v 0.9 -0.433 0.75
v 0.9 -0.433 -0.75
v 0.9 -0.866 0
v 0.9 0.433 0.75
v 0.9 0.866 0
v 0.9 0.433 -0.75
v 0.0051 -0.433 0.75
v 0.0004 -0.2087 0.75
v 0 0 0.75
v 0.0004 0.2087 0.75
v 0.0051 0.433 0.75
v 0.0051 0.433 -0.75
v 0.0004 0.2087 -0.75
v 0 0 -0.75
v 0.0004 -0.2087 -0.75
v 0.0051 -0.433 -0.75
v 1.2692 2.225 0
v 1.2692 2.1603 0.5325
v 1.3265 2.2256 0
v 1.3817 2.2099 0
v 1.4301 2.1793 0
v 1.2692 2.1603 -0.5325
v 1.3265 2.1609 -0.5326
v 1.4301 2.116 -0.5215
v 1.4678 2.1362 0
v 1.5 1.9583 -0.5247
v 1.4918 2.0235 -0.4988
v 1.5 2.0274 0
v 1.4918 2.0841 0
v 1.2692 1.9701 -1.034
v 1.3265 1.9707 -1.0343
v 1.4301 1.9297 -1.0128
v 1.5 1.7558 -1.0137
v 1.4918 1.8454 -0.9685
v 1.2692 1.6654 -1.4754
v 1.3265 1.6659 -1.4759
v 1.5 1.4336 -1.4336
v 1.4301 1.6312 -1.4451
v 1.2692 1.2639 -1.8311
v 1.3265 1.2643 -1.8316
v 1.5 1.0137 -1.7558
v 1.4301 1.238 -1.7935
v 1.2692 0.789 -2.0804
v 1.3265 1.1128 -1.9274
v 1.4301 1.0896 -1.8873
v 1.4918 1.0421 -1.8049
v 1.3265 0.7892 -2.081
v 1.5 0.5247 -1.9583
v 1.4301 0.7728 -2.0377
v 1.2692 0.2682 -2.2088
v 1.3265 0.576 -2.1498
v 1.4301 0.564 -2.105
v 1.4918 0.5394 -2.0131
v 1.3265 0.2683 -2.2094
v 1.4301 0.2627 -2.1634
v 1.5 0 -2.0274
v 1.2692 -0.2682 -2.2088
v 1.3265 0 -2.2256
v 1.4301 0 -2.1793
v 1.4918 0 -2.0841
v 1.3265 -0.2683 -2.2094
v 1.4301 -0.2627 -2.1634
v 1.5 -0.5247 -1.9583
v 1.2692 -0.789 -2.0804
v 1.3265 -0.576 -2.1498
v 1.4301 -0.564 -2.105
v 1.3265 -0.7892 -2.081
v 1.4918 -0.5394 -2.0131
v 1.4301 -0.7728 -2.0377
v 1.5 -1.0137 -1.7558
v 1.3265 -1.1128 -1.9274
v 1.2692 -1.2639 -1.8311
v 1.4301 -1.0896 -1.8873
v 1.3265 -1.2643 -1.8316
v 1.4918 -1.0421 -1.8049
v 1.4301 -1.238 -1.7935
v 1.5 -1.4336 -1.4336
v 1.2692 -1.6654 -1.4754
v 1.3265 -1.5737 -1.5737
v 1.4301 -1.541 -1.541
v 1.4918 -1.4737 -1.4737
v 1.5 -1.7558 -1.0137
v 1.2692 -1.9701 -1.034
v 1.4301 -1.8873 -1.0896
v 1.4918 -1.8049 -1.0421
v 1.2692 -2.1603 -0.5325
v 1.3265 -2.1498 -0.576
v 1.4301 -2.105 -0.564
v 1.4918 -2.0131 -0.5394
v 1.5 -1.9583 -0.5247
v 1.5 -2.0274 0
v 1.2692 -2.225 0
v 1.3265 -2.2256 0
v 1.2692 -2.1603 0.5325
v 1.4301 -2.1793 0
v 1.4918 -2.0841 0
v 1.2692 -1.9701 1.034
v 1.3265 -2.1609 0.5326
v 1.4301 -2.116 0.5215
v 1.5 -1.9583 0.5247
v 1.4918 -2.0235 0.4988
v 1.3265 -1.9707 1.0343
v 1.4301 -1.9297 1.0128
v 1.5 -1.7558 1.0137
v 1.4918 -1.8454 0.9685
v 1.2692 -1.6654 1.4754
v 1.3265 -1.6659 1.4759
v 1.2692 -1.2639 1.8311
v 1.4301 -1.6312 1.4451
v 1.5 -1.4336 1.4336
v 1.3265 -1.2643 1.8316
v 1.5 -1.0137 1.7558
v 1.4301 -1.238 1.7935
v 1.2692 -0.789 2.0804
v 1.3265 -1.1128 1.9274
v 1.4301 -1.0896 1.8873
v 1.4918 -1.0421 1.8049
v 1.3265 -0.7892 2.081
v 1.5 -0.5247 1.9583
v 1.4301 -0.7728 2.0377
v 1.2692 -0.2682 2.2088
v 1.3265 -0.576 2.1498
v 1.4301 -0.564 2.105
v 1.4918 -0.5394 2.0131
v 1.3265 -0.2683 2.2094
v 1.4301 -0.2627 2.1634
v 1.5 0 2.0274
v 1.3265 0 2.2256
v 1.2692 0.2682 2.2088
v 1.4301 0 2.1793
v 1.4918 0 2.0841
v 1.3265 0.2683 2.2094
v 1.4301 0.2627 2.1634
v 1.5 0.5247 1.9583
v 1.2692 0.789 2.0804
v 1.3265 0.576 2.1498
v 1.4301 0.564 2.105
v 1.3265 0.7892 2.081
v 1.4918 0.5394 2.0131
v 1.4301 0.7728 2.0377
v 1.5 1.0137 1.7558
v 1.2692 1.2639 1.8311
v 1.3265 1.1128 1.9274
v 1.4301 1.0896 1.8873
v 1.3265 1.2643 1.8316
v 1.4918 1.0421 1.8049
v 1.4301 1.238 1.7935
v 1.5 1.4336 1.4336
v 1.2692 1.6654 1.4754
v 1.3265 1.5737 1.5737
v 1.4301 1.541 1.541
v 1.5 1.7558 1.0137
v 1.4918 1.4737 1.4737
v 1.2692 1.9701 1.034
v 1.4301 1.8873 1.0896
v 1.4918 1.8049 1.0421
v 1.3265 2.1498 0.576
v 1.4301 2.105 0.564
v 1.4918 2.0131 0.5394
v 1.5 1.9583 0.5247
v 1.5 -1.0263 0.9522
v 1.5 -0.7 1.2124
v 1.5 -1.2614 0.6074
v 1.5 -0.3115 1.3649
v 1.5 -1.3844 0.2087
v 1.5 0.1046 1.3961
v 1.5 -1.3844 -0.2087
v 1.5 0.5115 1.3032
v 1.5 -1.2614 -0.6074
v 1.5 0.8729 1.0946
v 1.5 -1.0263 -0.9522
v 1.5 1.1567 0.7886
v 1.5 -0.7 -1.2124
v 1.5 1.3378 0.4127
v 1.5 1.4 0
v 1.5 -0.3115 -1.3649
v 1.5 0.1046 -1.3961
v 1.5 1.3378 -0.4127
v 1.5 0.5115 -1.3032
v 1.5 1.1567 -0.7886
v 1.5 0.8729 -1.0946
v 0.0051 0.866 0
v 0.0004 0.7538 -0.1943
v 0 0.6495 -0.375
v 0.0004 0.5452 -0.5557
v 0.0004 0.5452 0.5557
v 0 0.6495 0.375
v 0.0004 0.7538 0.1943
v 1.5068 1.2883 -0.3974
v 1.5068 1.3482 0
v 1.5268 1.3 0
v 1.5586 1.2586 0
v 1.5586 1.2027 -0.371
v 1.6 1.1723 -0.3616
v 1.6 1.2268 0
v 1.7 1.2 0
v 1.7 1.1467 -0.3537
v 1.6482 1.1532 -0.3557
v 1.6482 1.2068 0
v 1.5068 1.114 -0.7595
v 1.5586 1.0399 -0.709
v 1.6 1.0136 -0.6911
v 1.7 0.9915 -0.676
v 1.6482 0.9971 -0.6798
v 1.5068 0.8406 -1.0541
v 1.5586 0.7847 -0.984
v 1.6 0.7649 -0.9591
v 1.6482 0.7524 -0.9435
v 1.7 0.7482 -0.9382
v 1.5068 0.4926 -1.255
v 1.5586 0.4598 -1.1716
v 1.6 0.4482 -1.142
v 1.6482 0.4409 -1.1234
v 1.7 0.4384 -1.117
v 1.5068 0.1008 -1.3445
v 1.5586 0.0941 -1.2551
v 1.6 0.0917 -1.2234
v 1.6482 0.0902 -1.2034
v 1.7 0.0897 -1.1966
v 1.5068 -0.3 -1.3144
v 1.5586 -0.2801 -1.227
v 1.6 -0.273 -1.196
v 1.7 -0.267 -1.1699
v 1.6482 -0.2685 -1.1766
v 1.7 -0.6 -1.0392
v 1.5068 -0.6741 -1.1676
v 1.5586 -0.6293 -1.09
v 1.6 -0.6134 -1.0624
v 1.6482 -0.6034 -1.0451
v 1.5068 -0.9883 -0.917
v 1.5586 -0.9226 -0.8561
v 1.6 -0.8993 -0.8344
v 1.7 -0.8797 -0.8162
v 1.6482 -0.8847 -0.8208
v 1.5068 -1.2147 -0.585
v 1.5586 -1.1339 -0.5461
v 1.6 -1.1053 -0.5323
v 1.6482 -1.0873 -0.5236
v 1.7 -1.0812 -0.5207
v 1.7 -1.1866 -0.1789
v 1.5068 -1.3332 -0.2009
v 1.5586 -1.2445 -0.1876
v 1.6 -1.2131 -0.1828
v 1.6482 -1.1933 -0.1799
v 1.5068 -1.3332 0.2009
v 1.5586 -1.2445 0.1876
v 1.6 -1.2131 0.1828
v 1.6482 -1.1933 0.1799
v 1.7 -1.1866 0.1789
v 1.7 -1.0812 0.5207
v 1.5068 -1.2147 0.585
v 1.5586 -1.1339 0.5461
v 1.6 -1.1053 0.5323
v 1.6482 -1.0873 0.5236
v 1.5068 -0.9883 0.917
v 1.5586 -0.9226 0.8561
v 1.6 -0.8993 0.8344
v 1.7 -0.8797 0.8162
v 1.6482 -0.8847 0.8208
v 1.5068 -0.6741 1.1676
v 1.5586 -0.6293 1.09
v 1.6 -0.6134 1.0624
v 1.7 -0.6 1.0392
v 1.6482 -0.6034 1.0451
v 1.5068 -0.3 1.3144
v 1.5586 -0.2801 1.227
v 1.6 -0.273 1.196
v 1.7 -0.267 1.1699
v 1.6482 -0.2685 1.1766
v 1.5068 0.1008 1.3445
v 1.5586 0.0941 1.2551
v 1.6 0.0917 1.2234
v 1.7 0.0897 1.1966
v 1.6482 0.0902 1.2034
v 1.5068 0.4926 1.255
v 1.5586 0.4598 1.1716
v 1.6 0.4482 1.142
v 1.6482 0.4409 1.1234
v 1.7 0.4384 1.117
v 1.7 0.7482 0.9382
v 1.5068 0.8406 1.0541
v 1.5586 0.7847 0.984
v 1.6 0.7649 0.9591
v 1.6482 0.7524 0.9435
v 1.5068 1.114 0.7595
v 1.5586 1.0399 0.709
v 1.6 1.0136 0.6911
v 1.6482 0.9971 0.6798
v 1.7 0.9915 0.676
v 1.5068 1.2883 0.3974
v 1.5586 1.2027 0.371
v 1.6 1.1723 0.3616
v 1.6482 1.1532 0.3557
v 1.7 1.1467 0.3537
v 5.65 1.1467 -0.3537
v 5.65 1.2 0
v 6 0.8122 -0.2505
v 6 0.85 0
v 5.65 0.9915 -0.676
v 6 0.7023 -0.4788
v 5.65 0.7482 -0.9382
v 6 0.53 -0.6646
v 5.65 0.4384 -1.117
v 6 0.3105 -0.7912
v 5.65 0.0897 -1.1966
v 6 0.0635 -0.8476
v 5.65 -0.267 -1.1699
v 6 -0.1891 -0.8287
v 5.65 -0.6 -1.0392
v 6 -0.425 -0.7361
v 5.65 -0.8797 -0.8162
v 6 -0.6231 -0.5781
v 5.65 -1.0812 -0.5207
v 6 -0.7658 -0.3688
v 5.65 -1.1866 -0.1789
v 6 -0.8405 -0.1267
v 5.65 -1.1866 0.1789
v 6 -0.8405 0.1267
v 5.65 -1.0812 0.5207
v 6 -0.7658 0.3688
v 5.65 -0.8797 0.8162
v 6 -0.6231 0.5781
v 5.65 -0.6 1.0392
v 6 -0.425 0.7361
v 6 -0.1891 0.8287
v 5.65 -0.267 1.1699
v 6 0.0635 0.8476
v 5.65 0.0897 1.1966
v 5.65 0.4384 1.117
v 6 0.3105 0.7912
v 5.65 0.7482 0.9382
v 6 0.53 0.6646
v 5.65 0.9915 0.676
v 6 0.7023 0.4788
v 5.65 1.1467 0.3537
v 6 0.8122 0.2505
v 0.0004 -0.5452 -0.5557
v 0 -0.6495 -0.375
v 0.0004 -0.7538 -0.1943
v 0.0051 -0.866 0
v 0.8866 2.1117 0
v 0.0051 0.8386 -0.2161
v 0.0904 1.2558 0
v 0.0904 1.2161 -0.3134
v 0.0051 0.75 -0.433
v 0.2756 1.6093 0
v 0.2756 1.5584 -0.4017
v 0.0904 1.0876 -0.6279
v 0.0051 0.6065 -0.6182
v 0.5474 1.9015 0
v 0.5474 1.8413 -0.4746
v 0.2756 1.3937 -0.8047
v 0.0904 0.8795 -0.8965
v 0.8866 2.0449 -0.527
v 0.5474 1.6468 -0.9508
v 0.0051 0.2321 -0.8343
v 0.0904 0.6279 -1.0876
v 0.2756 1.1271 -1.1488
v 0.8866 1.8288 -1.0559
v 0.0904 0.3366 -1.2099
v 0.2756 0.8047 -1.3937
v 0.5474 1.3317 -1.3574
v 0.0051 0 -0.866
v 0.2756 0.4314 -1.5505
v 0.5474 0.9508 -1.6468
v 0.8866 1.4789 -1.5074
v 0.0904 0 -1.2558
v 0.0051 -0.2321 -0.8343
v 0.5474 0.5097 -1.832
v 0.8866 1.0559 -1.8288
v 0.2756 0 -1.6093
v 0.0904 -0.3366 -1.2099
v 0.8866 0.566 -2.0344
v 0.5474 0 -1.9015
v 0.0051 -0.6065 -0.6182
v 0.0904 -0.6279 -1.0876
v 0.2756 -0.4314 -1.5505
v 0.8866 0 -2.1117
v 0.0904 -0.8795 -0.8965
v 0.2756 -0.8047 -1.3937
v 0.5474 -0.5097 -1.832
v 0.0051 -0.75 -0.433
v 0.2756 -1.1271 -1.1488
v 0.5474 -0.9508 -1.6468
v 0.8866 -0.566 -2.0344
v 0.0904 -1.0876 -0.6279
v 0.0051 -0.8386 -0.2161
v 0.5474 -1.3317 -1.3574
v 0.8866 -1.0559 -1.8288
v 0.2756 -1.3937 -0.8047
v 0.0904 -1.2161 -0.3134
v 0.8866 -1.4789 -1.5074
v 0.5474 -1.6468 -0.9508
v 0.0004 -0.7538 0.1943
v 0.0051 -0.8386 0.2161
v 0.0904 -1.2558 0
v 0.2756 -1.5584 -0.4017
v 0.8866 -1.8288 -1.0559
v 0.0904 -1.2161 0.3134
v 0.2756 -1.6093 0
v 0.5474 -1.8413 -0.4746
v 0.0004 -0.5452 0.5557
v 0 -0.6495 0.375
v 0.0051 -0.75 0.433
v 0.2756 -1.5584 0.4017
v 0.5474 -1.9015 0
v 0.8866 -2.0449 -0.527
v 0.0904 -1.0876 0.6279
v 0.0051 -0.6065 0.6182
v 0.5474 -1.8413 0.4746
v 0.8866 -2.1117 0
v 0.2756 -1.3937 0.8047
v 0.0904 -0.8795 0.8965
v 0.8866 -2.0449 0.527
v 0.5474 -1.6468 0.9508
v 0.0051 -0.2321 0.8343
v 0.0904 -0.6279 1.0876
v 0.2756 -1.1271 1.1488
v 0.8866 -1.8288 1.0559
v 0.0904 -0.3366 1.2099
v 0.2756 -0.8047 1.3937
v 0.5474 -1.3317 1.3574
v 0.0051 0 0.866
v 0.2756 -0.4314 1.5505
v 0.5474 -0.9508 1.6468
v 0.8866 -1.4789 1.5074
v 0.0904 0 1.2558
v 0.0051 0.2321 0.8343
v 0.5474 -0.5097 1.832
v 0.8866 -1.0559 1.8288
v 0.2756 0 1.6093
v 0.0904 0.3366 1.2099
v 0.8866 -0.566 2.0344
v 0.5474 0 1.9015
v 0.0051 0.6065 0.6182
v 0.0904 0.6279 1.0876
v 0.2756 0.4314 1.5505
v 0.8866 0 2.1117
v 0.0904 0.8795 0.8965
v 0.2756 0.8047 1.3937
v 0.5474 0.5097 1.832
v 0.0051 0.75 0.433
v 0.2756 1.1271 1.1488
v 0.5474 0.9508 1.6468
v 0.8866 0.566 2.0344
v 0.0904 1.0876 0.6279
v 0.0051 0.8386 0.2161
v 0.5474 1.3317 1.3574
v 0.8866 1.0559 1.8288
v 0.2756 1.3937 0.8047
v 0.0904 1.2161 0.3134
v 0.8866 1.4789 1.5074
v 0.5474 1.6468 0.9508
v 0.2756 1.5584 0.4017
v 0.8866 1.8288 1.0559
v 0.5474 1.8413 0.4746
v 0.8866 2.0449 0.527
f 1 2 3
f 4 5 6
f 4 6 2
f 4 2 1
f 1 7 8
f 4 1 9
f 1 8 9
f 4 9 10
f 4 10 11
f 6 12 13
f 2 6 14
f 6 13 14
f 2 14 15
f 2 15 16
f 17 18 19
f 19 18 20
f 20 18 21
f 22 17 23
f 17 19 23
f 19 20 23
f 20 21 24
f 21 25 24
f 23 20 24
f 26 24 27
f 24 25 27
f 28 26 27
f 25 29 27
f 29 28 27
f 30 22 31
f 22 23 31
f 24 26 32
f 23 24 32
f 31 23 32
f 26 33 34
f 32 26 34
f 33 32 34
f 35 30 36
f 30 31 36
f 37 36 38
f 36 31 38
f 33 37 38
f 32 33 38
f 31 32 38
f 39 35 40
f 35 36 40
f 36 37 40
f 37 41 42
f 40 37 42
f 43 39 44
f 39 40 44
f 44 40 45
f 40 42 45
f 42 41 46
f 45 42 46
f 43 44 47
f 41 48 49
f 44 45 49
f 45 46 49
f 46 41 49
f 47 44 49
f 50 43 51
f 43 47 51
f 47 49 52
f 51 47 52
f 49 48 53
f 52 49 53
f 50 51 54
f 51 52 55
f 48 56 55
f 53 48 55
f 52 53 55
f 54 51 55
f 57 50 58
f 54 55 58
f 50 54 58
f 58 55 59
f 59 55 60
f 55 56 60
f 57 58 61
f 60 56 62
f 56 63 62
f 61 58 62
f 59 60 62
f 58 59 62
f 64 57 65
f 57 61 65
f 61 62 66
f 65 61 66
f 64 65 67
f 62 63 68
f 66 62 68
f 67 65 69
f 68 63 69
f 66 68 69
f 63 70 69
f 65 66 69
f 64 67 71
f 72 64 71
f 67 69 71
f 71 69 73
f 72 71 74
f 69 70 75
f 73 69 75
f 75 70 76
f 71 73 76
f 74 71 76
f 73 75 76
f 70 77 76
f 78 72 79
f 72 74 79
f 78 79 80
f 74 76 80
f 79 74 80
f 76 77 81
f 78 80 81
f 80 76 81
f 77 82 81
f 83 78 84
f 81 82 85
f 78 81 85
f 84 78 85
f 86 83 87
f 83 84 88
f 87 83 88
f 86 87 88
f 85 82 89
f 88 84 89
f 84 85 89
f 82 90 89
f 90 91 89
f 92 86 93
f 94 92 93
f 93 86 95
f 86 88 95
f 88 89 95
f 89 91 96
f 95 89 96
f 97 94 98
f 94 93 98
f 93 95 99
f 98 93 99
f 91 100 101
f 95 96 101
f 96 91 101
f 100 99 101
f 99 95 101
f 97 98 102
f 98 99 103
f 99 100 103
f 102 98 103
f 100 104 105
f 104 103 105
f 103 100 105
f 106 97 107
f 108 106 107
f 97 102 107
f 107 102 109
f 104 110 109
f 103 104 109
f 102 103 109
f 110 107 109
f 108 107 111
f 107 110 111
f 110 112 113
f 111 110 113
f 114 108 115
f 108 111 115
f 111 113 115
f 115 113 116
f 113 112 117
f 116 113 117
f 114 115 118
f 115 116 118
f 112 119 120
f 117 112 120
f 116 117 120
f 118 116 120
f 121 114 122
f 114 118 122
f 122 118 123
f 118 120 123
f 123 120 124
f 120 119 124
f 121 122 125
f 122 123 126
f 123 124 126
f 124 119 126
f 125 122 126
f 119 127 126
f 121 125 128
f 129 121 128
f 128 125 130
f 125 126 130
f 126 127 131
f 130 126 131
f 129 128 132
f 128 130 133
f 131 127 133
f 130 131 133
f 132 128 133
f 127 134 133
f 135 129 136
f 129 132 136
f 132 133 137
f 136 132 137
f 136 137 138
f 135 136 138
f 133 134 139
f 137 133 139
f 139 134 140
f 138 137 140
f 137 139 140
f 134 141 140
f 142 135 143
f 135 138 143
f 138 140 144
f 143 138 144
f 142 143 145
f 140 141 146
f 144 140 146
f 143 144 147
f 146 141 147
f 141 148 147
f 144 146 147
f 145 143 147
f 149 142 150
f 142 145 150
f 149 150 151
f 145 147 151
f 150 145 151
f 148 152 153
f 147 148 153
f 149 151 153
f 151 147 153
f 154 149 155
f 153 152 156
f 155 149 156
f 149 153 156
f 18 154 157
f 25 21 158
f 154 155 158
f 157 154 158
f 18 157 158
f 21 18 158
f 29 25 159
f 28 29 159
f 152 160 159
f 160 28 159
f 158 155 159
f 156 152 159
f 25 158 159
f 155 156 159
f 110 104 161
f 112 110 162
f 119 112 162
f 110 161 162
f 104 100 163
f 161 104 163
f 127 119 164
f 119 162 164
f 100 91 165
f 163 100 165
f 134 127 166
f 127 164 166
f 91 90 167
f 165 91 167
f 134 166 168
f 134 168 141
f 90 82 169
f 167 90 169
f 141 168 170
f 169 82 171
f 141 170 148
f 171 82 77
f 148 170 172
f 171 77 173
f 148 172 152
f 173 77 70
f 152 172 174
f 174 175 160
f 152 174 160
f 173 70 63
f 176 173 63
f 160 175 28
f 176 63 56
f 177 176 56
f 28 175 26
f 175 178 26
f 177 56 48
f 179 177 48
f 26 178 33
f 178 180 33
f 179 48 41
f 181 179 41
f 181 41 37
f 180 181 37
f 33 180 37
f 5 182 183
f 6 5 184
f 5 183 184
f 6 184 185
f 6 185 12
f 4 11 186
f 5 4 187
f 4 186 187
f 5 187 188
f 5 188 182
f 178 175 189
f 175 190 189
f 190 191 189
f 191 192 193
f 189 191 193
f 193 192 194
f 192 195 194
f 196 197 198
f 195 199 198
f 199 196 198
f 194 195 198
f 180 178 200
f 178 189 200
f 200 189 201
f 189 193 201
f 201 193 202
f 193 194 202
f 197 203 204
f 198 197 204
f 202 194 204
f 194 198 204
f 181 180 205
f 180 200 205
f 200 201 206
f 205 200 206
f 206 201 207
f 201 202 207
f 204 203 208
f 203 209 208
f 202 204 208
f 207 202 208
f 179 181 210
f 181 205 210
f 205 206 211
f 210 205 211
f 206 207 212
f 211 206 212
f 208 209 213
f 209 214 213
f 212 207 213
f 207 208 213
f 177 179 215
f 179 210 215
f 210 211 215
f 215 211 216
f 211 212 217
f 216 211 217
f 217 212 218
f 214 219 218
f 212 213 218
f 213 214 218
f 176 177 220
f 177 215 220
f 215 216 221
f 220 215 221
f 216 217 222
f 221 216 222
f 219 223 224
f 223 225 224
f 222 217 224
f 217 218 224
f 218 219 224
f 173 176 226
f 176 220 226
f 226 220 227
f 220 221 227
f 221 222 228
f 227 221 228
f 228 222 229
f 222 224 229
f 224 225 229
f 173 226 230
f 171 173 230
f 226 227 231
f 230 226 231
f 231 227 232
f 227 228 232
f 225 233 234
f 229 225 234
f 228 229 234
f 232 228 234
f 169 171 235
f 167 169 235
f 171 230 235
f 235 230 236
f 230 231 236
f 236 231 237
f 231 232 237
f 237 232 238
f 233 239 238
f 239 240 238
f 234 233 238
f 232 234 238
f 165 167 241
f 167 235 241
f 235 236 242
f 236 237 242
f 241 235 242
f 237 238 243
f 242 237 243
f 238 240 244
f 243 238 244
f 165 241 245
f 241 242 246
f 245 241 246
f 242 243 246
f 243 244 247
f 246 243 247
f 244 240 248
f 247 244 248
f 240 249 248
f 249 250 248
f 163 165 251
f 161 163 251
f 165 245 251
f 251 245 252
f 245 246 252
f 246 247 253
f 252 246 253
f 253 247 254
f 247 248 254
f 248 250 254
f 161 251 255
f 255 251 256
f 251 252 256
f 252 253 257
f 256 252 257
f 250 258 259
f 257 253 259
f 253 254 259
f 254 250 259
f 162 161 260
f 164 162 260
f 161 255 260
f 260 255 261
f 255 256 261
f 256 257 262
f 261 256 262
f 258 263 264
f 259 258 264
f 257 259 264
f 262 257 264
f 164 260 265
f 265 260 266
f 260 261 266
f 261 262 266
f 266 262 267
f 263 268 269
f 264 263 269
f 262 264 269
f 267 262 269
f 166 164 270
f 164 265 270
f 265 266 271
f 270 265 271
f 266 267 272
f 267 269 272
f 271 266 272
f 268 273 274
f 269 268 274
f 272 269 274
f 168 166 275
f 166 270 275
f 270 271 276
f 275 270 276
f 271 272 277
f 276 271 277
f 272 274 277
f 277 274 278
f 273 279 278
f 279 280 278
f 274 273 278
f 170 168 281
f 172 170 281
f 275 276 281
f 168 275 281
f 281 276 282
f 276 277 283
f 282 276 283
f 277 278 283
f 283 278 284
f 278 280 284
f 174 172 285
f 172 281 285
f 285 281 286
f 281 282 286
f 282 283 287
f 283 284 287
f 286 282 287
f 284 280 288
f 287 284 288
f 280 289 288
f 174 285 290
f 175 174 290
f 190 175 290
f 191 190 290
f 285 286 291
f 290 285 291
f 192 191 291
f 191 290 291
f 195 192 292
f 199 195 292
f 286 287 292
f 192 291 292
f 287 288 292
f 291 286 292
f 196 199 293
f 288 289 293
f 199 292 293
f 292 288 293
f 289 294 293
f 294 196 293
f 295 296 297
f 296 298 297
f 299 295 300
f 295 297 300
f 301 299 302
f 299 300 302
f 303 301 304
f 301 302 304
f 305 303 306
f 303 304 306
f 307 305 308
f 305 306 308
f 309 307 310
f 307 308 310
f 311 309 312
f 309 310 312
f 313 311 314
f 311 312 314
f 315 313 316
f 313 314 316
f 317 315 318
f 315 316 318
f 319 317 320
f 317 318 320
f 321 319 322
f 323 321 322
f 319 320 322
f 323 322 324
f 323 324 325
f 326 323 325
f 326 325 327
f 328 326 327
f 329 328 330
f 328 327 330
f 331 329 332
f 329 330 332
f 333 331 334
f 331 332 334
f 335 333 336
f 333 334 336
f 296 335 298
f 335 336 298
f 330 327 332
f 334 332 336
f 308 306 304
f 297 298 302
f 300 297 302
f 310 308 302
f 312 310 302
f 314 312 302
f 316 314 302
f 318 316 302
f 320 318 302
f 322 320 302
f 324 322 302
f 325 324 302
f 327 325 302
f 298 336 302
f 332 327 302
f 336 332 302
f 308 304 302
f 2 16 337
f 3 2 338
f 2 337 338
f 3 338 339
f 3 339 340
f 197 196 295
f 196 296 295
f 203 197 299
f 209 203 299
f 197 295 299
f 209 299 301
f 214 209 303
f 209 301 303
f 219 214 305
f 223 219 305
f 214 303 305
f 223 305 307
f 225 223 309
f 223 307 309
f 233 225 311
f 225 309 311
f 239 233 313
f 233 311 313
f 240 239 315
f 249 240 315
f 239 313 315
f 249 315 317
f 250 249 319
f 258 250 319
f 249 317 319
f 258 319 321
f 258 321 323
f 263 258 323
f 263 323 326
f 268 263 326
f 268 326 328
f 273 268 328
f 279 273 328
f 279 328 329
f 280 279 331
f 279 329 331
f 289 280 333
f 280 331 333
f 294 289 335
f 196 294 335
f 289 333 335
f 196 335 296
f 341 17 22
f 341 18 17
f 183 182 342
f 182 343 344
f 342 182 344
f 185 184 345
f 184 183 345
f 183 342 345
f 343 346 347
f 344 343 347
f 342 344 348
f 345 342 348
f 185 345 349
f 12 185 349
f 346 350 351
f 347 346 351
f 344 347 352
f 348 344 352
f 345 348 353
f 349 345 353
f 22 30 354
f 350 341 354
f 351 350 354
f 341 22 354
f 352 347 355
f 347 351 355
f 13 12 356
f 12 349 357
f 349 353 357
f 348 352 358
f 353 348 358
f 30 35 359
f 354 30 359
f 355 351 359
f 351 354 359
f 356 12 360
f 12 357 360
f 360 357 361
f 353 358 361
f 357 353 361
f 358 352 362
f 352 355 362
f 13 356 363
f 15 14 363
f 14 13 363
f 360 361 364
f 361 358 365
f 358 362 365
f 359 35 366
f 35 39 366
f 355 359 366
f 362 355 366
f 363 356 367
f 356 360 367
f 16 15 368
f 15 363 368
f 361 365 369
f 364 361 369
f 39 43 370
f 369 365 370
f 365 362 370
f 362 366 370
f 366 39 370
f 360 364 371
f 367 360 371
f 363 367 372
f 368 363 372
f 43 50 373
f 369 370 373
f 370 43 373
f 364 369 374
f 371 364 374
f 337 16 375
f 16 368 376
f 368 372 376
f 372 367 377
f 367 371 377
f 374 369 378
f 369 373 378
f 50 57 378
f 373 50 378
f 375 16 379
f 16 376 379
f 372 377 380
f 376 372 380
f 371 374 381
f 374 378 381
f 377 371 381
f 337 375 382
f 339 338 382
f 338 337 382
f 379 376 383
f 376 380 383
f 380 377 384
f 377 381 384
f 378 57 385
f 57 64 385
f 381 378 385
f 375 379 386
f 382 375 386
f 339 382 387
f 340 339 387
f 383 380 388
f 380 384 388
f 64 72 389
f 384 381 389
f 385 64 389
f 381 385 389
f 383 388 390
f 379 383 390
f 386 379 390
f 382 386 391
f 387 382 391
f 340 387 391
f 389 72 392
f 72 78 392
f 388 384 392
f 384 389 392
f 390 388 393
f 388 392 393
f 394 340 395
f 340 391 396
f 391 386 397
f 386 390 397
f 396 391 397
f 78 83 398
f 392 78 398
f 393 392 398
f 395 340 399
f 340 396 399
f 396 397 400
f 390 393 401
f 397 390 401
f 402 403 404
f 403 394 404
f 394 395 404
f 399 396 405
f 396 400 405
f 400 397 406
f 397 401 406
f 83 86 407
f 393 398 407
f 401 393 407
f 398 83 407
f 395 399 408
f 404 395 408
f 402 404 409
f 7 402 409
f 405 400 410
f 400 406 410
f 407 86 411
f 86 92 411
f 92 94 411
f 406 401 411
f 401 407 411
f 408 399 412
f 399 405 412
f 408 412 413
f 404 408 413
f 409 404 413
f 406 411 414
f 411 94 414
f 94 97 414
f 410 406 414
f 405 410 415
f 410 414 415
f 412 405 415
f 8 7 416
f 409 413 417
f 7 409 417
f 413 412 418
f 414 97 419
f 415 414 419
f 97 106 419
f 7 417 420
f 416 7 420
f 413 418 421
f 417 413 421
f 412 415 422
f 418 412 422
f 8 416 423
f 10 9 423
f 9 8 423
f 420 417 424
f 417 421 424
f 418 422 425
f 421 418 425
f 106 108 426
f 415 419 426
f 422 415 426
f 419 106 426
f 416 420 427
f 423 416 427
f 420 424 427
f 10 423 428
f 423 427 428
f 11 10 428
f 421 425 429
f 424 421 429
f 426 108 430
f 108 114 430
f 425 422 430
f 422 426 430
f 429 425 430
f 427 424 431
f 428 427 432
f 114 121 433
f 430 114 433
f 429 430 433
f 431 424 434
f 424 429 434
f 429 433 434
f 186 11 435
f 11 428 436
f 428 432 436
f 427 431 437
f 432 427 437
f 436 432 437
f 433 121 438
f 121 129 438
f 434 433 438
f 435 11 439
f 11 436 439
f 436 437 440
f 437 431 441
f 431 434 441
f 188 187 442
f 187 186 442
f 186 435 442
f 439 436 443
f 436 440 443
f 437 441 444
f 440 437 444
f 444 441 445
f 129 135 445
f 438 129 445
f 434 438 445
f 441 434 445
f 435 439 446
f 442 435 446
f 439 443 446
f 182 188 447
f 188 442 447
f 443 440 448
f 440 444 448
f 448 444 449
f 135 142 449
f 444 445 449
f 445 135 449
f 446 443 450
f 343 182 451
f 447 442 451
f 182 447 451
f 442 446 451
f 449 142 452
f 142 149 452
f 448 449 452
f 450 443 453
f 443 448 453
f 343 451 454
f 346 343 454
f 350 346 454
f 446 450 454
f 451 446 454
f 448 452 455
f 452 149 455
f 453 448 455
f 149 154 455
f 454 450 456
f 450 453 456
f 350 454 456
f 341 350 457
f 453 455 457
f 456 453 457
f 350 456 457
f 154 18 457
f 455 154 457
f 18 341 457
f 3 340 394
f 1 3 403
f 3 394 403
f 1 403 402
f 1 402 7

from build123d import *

# Parameters (mm, degrees)
CUT_EXTRUDE1_DEPTH = 0.9


with BuildPart() as part:
    # Sketch1 → Revolve1 (revolve)
    with BuildSketch(Plane.XY):
        with BuildLine():
            Line((0, 0), (0, 0.742857779))
            ThreePointArc((0, 0.742857779), (0.360668212, 1.718523233), (1.269230769, 2.225))
            ThreePointArc((1.269230769, 2.225), (1.430088727, 2.179291942), (1.5, 2.027381037))
            Line((1.5, 2.027381037), (1.5, 1.4))
            ThreePointArc((1.5, 1.4), (1.558578644, 1.258578644), (1.7, 1.2))
            Line((1.7, 1.2), (5.65, 1.2))
            Line((5.65, 1.2), (6, 0.85))
            Line((6, 0.85), (6, 0))
            Line((6, 0), (0, 0))
        make_face()
    revolve(axis=Axis((0, 0, 0), (-1, 0, 0)))

    # Sketch2 → Cut-Extrude1 (cut)
    with BuildSketch(Plane.ZY):
        Polygon((0.75, -0.433012702), (0.75, 0.433012702), (0, 0.866025404), (-0.75, 0.433012702), (-0.75, -0.433012702), (0, -0.866025404), align=None)
    extrude(amount=-CUT_EXTRUDE1_DEPTH, mode=Mode.SUBTRACT)


solid = part.part
